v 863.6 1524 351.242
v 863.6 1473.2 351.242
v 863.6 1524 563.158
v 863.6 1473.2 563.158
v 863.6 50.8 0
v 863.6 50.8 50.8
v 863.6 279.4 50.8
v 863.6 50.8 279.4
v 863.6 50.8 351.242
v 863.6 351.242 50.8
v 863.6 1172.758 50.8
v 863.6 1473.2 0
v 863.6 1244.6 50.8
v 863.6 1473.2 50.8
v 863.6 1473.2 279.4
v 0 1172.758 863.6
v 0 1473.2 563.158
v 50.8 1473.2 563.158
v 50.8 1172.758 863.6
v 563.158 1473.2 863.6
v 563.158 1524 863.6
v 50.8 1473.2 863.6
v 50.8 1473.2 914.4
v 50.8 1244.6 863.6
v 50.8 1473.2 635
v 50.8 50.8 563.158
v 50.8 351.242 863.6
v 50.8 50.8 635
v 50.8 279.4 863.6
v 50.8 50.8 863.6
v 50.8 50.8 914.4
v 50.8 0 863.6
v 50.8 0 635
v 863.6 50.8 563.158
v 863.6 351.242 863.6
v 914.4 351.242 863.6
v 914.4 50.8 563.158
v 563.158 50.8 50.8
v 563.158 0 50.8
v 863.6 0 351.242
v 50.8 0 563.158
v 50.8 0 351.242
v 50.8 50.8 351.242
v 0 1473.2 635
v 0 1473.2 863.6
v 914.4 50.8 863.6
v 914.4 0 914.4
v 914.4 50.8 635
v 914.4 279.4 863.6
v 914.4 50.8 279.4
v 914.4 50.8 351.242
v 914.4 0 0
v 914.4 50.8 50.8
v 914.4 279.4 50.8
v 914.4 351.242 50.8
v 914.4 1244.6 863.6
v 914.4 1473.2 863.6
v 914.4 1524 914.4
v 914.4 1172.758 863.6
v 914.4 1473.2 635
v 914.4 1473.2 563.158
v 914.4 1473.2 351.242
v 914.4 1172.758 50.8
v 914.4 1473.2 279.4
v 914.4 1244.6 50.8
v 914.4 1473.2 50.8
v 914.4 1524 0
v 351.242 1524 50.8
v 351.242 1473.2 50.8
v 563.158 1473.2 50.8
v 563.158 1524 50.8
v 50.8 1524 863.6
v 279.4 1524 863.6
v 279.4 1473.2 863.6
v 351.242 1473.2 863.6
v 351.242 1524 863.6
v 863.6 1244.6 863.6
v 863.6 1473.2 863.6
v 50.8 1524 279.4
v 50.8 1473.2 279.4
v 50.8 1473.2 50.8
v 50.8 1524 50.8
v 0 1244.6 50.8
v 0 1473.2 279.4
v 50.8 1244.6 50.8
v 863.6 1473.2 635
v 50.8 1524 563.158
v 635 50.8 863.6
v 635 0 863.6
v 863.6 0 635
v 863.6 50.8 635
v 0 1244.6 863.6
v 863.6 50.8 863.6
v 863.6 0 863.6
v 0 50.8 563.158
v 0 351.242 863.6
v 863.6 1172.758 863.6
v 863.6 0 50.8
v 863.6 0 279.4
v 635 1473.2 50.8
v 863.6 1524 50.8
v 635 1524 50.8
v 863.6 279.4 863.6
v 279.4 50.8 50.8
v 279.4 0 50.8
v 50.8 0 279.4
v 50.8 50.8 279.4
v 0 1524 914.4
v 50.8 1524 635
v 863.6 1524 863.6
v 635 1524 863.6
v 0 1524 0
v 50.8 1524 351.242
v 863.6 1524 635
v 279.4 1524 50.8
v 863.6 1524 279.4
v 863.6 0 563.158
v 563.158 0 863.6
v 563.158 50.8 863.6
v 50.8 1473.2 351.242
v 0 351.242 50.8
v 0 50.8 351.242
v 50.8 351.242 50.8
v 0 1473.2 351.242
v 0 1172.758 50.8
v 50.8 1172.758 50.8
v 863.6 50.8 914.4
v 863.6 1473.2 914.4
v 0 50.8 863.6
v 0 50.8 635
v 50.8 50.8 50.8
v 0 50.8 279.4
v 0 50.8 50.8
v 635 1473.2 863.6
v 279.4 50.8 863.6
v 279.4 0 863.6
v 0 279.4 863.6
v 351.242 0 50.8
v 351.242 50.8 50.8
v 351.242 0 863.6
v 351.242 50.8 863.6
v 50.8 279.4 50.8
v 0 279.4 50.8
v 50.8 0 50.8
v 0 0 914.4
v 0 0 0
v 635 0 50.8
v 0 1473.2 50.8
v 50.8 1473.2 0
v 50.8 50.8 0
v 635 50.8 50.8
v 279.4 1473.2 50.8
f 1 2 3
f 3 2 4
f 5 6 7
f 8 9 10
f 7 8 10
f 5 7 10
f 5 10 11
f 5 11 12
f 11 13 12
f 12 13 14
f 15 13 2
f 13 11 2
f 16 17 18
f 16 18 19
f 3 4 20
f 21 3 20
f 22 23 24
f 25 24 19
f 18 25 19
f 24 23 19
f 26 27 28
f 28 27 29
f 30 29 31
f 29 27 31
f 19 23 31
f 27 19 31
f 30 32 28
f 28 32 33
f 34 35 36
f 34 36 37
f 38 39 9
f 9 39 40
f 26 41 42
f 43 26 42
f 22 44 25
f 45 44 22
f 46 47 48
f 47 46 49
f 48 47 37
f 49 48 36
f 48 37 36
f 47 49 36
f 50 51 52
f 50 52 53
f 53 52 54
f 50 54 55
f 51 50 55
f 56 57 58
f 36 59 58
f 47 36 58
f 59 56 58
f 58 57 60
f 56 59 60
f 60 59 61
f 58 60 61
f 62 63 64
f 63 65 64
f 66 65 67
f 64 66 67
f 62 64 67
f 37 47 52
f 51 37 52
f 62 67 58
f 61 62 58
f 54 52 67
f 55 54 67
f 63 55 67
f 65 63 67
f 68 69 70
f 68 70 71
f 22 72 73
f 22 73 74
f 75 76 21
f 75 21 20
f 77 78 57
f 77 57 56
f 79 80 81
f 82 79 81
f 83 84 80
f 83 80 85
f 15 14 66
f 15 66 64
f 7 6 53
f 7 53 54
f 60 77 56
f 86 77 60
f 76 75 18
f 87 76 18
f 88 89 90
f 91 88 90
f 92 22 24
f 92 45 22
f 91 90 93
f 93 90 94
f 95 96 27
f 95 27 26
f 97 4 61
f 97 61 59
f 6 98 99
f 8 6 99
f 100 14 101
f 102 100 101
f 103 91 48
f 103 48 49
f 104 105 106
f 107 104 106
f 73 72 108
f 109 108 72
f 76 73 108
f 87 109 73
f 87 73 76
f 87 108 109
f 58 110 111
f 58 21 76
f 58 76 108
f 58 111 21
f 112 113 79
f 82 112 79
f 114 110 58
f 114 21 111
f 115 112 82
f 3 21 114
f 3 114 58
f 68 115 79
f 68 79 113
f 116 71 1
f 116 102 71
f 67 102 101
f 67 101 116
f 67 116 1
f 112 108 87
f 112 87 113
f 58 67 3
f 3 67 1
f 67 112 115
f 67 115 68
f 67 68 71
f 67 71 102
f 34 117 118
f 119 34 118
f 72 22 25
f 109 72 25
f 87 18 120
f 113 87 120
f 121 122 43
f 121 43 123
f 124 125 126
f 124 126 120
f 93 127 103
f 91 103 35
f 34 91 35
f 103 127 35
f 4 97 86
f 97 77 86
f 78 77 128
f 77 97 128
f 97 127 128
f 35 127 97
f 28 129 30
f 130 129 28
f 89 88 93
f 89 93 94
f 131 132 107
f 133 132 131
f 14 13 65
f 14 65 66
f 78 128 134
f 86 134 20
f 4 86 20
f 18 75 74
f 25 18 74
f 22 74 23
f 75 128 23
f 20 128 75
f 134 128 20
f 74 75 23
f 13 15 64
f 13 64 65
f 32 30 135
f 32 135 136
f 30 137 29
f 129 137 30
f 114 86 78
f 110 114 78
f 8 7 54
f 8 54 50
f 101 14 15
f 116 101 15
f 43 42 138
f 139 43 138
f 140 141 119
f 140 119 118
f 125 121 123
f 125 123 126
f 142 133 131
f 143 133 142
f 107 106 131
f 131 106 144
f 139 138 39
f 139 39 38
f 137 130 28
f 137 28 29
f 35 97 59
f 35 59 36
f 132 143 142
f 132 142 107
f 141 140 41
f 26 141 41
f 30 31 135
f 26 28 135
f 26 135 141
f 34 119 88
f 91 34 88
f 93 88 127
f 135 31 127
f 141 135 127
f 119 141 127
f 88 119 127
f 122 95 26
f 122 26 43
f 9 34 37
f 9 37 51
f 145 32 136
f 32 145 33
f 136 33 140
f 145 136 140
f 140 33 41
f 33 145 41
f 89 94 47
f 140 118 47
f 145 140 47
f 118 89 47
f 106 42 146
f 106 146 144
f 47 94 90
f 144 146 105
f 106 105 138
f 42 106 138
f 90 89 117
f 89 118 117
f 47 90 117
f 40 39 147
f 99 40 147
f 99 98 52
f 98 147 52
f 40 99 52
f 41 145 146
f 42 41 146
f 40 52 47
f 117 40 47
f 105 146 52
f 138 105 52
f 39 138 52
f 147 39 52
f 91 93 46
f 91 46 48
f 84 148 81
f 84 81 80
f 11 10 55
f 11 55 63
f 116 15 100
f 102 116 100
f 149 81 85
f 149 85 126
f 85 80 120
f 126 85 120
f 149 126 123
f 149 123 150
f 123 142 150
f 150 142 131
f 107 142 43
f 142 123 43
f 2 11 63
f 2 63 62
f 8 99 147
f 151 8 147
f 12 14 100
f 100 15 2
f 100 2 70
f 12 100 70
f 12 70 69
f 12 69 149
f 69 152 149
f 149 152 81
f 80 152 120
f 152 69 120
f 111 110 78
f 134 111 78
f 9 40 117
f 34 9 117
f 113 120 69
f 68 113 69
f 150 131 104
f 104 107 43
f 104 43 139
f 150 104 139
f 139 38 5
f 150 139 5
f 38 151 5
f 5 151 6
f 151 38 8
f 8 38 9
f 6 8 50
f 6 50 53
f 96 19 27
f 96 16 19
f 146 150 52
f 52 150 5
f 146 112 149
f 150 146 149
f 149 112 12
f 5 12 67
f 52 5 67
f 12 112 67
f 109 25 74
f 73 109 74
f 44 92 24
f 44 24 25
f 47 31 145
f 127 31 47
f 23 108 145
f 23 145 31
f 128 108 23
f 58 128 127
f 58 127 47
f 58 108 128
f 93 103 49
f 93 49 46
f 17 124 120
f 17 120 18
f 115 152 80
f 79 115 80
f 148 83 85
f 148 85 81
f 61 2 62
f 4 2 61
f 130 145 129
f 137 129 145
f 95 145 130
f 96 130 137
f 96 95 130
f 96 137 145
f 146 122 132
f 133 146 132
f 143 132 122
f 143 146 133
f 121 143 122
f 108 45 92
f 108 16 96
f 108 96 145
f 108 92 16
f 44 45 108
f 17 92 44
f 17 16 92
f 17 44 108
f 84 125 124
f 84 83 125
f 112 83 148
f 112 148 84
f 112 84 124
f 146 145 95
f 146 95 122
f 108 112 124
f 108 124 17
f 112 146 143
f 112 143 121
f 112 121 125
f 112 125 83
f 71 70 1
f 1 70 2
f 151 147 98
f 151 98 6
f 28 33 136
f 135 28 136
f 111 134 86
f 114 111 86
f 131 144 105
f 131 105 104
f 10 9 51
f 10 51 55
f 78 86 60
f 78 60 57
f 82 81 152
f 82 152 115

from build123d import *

# Parameters (mm, degrees)
F0_W     = 914.4
F0_H     = 1524
F1_DEPTH = 914.4
F3_DEPTH = 2540
F5_DEPTH = 2540
F7_DEPTH = 914.4


with BuildPart() as f1:
    # F0 (on Top) → F1 (new body)
    with BuildSketch(Plane.XY):
        with Locations((457.2, 762)):
            Rectangle(F0_W, F0_H)
    extrude(amount=F1_DEPTH)

    # F2 (on Right) → F3 (cut)
    with BuildSketch(Plane.YZ):
        Polygon((1244.6, 863.6), (1473.2, 635), (1473.2, 863.6), align=None)
        Polygon((1244.6, 50.8), (1473.2, 50.8), (1473.2, 279.4), align=None)
        Polygon((1172.757951, 50.8), (1473.2, 351.242049), (1473.2, 563.157951), (1172.757951, 863.6), (351.242049, 863.6), (50.8, 563.157951), (50.8, 351.242049), (351.242049, 50.8), align=None)
        Polygon((50.8, 635), (279.4, 863.6), (50.8, 863.6), align=None)
        Polygon((50.8, 50.8), (279.4, 50.8), (50.8, 279.4), align=None)
    extrude(amount=F3_DEPTH, mode=Mode.SUBTRACT)

    # F4 (on Front) → F5 (cut)
    with BuildSketch(Plane.XZ):
        Polygon((50.8, 351.242049), (351.242049, 50.8), (563.157951, 50.8), (863.6, 351.242049), (863.6, 563.157951), (563.157951, 863.6), (351.242049, 863.6), (50.8, 563.157951), align=None)
        Polygon((50.8, 863.6), (50.8, 635), (279.4, 863.6), align=None)
        Polygon((50.8, 279.4), (50.8, 50.8), (279.4, 50.8), align=None)
        Polygon((863.6, 279.4), (635, 50.8), (863.6, 50.8), align=None)
        Polygon((635, 863.6), (863.6, 635), (863.6, 863.6), align=None)
    extrude(amount=-F5_DEPTH, mode=Mode.SUBTRACT)

    # F6 (on face) → F7 (cut)
    with BuildSketch(Plane.XY.offset(914.4)):
        Polygon((50.8, 1473.2), (50.8, 1472.929239), (50.8, 50.8), (863.6, 50.8), (863.6, 1473.2), align=None)
    extrude(amount=-F7_DEPTH, mode=Mode.SUBTRACT)


solid = f1.part
